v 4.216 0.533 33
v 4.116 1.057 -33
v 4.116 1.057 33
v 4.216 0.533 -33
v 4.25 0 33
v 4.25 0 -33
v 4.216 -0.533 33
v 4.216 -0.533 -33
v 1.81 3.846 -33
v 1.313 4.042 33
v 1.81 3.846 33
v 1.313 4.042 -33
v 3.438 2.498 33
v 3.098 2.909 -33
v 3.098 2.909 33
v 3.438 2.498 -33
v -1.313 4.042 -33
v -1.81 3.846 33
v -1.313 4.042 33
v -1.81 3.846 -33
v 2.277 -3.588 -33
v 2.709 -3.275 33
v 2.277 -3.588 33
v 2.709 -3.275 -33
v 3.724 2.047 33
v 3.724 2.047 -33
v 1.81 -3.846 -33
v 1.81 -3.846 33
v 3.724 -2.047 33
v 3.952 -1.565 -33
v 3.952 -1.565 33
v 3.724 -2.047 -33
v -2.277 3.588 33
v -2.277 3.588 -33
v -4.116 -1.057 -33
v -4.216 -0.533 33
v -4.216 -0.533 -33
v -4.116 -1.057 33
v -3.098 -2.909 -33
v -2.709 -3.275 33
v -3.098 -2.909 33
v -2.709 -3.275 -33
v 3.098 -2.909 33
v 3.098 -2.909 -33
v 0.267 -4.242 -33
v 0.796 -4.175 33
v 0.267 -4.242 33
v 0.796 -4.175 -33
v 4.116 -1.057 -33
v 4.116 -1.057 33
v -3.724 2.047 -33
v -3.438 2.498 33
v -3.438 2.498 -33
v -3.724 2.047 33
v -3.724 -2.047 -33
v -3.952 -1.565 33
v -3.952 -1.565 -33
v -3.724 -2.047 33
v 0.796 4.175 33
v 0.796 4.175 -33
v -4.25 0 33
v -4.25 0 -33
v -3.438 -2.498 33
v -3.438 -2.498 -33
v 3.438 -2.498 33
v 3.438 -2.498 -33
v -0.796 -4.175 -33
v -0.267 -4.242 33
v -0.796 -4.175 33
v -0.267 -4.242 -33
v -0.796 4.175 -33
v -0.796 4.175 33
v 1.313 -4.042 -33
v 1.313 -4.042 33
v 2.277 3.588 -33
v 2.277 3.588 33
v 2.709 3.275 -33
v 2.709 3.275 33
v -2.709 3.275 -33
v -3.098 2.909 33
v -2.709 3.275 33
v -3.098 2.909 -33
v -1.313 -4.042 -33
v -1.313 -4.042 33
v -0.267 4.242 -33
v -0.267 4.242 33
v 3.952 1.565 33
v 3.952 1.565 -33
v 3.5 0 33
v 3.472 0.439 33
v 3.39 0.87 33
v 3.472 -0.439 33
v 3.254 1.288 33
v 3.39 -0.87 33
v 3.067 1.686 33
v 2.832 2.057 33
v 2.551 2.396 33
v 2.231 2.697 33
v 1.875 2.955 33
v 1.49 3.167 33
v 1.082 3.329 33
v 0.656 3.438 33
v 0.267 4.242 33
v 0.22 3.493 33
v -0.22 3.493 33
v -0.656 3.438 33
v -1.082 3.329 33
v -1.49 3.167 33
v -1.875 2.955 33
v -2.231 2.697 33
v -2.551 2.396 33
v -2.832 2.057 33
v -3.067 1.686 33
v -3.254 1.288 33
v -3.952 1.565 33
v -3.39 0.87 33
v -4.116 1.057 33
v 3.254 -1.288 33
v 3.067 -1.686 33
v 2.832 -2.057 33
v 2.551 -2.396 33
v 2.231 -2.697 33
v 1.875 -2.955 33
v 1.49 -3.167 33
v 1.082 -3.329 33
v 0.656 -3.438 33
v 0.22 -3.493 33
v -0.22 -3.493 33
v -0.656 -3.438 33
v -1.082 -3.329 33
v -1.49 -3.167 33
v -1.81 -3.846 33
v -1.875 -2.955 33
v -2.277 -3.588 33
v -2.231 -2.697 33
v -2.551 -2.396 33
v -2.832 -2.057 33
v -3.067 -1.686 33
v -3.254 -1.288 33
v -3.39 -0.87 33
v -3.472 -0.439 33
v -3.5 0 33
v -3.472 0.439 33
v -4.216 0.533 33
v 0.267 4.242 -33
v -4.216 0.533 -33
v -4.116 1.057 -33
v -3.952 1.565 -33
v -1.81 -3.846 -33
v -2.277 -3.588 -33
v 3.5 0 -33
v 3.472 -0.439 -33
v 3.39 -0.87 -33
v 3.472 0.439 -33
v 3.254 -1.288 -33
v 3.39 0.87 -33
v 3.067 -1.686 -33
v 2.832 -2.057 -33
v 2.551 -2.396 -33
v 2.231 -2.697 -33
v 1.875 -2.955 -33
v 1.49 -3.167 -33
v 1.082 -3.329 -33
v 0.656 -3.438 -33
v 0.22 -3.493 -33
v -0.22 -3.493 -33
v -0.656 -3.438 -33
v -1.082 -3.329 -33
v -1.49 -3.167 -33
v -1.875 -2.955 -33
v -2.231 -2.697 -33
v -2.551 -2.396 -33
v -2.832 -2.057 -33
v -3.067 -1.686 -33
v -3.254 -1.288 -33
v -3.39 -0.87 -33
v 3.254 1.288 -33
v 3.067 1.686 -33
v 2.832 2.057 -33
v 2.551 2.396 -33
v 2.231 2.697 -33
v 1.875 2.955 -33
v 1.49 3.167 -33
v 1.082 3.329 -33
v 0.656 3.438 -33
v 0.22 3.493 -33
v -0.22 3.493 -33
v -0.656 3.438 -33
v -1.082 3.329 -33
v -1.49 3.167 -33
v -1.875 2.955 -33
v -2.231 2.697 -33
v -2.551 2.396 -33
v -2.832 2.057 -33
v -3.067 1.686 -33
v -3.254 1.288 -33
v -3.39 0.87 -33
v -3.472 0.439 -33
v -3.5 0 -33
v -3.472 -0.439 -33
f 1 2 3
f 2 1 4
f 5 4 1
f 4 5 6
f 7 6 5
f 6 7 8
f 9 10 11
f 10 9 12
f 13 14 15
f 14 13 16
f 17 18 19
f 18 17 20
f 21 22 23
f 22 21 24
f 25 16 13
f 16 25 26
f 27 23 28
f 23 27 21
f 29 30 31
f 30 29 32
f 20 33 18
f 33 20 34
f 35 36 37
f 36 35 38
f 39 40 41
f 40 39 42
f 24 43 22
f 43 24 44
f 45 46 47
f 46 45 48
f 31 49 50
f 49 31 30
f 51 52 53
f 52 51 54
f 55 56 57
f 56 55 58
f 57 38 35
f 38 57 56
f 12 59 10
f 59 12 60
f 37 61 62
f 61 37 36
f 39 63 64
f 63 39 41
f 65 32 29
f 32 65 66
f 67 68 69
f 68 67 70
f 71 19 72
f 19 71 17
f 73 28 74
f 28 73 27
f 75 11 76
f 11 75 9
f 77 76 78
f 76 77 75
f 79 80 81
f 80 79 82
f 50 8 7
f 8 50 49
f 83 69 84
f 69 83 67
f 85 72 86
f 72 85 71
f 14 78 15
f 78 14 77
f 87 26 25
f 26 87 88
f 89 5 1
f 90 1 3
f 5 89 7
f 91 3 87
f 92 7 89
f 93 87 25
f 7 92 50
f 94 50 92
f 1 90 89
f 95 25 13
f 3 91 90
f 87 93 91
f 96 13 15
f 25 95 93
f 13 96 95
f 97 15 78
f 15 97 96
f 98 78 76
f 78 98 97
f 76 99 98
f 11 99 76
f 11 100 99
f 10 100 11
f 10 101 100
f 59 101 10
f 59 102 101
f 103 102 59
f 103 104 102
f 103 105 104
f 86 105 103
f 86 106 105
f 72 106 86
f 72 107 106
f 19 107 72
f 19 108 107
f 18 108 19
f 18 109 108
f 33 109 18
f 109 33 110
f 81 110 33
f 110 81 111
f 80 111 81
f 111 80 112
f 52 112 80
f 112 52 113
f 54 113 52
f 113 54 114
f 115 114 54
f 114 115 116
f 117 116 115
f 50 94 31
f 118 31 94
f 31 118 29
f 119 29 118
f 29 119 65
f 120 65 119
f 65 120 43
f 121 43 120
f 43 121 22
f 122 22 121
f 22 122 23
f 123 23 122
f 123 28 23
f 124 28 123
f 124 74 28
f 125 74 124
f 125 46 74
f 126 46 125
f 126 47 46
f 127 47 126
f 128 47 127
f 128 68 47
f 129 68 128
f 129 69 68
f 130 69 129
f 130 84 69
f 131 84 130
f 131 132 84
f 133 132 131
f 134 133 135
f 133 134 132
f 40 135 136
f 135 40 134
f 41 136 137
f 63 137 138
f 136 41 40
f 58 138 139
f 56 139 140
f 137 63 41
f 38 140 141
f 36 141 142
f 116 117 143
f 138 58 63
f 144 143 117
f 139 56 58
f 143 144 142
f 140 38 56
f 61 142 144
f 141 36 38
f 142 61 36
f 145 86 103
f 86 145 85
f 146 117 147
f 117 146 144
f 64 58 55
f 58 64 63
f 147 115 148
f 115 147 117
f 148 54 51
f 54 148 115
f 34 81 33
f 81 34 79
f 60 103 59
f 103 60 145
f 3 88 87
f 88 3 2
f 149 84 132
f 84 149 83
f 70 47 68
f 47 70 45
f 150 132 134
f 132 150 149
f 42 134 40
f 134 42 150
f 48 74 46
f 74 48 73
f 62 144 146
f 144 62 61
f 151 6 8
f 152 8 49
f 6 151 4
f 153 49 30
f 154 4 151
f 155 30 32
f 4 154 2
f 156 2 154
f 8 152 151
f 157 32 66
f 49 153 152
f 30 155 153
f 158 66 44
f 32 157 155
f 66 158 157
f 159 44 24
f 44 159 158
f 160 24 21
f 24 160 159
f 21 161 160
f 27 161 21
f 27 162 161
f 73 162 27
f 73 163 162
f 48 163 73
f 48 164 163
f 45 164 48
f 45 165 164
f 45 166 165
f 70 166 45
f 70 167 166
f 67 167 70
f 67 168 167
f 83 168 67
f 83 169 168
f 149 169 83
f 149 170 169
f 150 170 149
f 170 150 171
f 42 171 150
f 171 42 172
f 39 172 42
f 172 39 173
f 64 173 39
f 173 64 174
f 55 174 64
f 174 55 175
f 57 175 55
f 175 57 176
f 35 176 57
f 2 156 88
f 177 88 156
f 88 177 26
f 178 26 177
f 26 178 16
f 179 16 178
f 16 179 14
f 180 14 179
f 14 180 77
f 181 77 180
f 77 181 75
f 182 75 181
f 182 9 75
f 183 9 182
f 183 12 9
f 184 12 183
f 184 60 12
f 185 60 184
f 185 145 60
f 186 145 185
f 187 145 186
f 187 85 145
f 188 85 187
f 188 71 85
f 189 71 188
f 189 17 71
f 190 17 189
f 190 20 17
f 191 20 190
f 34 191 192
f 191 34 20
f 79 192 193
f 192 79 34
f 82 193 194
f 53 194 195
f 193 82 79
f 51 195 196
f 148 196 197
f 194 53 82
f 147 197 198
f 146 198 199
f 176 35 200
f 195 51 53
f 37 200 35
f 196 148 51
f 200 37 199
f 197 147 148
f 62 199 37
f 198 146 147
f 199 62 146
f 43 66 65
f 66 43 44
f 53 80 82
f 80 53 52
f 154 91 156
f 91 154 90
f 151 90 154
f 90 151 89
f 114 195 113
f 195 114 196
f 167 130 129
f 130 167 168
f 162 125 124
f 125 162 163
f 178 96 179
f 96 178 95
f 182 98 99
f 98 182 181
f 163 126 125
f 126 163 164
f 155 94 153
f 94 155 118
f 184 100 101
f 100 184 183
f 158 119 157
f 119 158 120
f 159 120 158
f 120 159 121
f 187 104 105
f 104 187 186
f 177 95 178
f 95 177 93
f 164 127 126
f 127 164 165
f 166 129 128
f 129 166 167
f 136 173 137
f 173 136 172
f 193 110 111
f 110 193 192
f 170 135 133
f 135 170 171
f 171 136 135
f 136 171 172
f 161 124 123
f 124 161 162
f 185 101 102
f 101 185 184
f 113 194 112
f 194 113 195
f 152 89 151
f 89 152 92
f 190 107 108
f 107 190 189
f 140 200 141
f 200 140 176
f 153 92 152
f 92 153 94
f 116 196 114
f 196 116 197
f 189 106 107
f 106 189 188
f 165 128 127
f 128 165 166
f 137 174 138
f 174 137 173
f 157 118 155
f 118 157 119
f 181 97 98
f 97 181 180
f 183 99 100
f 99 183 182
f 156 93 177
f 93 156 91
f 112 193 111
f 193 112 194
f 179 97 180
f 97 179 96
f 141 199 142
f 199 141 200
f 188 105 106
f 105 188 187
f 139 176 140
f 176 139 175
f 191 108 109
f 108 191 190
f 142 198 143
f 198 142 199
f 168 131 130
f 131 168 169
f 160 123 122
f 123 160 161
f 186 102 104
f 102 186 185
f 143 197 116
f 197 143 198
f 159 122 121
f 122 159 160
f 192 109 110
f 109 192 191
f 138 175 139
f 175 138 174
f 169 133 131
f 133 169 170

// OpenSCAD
$fn = 50;


difference() {
	union() {
		translate(v = [0, 0, -33.0000000000]) {
			cylinder(h = 66, r = 4.2500000000);
		}
	}
	union() {
		translate(v = [0, 0, -100.0000000000]) {
			cylinder(h = 200, r = 3.5000000000);
		}
	}
}
